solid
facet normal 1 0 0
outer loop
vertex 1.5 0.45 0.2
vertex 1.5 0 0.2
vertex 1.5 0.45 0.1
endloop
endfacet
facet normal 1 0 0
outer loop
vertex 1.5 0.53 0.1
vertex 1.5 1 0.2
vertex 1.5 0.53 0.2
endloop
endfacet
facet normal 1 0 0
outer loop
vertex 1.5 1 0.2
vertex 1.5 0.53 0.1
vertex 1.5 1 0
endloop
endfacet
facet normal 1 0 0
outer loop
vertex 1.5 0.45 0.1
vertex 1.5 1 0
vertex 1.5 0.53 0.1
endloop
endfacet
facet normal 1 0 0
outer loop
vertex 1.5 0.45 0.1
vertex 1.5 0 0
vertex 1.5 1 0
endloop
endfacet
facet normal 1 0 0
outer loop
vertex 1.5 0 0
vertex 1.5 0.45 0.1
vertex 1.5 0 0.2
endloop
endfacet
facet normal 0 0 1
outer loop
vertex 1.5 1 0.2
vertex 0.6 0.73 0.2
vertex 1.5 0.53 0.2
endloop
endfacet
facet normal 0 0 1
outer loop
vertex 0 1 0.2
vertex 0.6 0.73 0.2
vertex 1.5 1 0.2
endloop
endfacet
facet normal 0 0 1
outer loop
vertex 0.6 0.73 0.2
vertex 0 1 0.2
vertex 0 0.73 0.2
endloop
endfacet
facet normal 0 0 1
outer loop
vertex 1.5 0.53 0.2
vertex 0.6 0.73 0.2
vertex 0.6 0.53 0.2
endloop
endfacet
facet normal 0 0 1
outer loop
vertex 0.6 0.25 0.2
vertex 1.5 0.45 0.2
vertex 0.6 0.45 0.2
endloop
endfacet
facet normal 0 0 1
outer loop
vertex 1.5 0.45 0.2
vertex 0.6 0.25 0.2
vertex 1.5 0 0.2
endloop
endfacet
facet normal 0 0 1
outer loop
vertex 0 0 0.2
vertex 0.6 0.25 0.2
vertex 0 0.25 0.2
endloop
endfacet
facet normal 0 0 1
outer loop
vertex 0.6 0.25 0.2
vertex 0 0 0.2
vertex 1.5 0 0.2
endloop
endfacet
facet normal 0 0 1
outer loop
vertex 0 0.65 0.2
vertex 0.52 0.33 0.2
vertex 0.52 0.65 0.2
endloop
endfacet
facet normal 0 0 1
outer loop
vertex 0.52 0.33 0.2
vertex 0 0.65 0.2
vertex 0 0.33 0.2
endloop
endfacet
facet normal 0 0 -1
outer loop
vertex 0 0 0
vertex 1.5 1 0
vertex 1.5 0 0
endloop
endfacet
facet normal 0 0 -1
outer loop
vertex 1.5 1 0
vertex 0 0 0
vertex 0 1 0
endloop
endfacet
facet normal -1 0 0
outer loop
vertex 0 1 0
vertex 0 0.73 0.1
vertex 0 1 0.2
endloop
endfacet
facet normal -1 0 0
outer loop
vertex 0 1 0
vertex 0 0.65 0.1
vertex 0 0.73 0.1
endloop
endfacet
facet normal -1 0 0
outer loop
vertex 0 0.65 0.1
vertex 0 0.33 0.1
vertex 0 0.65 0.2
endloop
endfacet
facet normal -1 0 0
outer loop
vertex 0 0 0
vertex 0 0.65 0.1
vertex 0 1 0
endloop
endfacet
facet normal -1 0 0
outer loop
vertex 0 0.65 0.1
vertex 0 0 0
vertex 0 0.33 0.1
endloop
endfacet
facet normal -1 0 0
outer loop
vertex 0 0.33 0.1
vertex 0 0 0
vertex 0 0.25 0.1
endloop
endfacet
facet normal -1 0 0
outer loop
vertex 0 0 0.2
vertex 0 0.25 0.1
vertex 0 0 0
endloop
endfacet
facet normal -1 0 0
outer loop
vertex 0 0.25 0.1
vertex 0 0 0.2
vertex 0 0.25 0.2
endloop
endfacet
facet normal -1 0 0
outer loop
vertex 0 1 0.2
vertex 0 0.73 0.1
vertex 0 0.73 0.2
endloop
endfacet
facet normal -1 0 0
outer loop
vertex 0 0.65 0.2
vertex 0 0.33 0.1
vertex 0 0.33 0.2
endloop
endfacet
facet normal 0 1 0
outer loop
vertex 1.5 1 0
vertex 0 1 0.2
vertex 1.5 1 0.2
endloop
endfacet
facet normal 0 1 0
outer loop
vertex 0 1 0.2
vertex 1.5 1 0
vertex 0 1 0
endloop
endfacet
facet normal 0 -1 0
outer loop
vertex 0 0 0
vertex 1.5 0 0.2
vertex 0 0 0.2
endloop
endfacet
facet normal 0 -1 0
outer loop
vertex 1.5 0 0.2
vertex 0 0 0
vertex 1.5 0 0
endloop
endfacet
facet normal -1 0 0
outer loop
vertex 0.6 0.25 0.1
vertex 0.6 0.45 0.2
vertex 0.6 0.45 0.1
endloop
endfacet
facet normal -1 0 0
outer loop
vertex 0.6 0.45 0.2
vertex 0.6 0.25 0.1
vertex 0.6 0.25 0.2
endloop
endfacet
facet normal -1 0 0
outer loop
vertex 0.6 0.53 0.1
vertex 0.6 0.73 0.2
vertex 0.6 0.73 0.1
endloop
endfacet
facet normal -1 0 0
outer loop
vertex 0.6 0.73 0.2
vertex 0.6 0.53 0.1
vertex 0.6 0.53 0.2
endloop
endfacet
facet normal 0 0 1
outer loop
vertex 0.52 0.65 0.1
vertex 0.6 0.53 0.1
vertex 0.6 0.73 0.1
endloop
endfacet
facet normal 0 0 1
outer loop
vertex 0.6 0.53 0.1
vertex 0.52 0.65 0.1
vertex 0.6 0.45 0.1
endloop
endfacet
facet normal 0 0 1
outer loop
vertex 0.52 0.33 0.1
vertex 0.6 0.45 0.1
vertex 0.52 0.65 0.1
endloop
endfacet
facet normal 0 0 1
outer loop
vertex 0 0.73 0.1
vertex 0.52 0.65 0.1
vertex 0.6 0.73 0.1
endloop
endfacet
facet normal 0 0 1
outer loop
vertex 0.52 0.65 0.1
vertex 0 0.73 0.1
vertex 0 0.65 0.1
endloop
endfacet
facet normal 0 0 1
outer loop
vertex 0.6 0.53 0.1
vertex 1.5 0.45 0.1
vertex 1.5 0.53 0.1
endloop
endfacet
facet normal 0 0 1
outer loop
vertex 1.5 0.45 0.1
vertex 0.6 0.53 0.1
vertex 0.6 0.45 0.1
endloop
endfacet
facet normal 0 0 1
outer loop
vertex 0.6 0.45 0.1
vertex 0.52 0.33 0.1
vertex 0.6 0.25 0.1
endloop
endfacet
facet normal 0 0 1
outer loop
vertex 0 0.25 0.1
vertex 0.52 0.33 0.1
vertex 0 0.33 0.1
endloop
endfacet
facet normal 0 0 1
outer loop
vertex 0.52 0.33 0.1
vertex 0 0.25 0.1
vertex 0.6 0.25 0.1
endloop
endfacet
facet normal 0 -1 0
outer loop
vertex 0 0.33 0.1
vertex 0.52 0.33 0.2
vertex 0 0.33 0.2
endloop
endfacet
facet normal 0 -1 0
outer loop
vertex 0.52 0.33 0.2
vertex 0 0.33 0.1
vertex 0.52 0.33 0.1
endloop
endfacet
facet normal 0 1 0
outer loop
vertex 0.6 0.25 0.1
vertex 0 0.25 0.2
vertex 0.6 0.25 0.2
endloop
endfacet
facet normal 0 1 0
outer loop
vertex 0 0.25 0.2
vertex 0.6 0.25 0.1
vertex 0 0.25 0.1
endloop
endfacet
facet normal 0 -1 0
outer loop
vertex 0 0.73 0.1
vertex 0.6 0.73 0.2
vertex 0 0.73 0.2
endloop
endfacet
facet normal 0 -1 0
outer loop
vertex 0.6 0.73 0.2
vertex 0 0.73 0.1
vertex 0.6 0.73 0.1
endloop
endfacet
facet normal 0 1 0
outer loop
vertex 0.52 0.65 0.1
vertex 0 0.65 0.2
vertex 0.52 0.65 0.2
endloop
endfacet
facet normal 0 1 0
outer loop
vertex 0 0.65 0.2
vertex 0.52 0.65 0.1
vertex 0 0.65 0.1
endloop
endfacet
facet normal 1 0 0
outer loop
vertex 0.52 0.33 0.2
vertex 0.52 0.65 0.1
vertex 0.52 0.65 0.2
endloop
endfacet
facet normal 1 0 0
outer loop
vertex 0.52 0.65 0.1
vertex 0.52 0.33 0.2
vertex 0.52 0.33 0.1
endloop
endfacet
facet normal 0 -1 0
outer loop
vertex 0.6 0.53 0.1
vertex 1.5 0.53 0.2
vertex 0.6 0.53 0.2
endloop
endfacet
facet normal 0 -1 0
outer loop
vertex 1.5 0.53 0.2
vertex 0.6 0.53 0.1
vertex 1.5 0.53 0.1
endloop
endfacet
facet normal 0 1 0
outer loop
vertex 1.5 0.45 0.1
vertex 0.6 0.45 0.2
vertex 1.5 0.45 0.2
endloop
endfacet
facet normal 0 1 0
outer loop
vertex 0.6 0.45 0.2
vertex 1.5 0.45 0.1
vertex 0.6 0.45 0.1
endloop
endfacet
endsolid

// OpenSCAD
// FR : géométrie illustrative, unités mm, fonction non validée.
// EN: illustrative geometry, mm units, unvalidated function.
// ES: geometría ilustrativa, unidades mm, función no validada.
scale([1, 1, 1]) {
difference() {
  cube([1.5, 1, 0.2]);
  translate([-0.01, 0.25, 0.1]) cube([0.61, 0.08, 0.11]);
  translate([-0.01, 0.65, 0.1]) cube([0.61, 0.08, 0.11]);
  translate([0.52, 0.25, 0.1]) cube([0.08, 0.48, 0.11]);
  translate([0.52, 0.45, 0.1]) cube([1, 0.08, 0.11]);
}
}
